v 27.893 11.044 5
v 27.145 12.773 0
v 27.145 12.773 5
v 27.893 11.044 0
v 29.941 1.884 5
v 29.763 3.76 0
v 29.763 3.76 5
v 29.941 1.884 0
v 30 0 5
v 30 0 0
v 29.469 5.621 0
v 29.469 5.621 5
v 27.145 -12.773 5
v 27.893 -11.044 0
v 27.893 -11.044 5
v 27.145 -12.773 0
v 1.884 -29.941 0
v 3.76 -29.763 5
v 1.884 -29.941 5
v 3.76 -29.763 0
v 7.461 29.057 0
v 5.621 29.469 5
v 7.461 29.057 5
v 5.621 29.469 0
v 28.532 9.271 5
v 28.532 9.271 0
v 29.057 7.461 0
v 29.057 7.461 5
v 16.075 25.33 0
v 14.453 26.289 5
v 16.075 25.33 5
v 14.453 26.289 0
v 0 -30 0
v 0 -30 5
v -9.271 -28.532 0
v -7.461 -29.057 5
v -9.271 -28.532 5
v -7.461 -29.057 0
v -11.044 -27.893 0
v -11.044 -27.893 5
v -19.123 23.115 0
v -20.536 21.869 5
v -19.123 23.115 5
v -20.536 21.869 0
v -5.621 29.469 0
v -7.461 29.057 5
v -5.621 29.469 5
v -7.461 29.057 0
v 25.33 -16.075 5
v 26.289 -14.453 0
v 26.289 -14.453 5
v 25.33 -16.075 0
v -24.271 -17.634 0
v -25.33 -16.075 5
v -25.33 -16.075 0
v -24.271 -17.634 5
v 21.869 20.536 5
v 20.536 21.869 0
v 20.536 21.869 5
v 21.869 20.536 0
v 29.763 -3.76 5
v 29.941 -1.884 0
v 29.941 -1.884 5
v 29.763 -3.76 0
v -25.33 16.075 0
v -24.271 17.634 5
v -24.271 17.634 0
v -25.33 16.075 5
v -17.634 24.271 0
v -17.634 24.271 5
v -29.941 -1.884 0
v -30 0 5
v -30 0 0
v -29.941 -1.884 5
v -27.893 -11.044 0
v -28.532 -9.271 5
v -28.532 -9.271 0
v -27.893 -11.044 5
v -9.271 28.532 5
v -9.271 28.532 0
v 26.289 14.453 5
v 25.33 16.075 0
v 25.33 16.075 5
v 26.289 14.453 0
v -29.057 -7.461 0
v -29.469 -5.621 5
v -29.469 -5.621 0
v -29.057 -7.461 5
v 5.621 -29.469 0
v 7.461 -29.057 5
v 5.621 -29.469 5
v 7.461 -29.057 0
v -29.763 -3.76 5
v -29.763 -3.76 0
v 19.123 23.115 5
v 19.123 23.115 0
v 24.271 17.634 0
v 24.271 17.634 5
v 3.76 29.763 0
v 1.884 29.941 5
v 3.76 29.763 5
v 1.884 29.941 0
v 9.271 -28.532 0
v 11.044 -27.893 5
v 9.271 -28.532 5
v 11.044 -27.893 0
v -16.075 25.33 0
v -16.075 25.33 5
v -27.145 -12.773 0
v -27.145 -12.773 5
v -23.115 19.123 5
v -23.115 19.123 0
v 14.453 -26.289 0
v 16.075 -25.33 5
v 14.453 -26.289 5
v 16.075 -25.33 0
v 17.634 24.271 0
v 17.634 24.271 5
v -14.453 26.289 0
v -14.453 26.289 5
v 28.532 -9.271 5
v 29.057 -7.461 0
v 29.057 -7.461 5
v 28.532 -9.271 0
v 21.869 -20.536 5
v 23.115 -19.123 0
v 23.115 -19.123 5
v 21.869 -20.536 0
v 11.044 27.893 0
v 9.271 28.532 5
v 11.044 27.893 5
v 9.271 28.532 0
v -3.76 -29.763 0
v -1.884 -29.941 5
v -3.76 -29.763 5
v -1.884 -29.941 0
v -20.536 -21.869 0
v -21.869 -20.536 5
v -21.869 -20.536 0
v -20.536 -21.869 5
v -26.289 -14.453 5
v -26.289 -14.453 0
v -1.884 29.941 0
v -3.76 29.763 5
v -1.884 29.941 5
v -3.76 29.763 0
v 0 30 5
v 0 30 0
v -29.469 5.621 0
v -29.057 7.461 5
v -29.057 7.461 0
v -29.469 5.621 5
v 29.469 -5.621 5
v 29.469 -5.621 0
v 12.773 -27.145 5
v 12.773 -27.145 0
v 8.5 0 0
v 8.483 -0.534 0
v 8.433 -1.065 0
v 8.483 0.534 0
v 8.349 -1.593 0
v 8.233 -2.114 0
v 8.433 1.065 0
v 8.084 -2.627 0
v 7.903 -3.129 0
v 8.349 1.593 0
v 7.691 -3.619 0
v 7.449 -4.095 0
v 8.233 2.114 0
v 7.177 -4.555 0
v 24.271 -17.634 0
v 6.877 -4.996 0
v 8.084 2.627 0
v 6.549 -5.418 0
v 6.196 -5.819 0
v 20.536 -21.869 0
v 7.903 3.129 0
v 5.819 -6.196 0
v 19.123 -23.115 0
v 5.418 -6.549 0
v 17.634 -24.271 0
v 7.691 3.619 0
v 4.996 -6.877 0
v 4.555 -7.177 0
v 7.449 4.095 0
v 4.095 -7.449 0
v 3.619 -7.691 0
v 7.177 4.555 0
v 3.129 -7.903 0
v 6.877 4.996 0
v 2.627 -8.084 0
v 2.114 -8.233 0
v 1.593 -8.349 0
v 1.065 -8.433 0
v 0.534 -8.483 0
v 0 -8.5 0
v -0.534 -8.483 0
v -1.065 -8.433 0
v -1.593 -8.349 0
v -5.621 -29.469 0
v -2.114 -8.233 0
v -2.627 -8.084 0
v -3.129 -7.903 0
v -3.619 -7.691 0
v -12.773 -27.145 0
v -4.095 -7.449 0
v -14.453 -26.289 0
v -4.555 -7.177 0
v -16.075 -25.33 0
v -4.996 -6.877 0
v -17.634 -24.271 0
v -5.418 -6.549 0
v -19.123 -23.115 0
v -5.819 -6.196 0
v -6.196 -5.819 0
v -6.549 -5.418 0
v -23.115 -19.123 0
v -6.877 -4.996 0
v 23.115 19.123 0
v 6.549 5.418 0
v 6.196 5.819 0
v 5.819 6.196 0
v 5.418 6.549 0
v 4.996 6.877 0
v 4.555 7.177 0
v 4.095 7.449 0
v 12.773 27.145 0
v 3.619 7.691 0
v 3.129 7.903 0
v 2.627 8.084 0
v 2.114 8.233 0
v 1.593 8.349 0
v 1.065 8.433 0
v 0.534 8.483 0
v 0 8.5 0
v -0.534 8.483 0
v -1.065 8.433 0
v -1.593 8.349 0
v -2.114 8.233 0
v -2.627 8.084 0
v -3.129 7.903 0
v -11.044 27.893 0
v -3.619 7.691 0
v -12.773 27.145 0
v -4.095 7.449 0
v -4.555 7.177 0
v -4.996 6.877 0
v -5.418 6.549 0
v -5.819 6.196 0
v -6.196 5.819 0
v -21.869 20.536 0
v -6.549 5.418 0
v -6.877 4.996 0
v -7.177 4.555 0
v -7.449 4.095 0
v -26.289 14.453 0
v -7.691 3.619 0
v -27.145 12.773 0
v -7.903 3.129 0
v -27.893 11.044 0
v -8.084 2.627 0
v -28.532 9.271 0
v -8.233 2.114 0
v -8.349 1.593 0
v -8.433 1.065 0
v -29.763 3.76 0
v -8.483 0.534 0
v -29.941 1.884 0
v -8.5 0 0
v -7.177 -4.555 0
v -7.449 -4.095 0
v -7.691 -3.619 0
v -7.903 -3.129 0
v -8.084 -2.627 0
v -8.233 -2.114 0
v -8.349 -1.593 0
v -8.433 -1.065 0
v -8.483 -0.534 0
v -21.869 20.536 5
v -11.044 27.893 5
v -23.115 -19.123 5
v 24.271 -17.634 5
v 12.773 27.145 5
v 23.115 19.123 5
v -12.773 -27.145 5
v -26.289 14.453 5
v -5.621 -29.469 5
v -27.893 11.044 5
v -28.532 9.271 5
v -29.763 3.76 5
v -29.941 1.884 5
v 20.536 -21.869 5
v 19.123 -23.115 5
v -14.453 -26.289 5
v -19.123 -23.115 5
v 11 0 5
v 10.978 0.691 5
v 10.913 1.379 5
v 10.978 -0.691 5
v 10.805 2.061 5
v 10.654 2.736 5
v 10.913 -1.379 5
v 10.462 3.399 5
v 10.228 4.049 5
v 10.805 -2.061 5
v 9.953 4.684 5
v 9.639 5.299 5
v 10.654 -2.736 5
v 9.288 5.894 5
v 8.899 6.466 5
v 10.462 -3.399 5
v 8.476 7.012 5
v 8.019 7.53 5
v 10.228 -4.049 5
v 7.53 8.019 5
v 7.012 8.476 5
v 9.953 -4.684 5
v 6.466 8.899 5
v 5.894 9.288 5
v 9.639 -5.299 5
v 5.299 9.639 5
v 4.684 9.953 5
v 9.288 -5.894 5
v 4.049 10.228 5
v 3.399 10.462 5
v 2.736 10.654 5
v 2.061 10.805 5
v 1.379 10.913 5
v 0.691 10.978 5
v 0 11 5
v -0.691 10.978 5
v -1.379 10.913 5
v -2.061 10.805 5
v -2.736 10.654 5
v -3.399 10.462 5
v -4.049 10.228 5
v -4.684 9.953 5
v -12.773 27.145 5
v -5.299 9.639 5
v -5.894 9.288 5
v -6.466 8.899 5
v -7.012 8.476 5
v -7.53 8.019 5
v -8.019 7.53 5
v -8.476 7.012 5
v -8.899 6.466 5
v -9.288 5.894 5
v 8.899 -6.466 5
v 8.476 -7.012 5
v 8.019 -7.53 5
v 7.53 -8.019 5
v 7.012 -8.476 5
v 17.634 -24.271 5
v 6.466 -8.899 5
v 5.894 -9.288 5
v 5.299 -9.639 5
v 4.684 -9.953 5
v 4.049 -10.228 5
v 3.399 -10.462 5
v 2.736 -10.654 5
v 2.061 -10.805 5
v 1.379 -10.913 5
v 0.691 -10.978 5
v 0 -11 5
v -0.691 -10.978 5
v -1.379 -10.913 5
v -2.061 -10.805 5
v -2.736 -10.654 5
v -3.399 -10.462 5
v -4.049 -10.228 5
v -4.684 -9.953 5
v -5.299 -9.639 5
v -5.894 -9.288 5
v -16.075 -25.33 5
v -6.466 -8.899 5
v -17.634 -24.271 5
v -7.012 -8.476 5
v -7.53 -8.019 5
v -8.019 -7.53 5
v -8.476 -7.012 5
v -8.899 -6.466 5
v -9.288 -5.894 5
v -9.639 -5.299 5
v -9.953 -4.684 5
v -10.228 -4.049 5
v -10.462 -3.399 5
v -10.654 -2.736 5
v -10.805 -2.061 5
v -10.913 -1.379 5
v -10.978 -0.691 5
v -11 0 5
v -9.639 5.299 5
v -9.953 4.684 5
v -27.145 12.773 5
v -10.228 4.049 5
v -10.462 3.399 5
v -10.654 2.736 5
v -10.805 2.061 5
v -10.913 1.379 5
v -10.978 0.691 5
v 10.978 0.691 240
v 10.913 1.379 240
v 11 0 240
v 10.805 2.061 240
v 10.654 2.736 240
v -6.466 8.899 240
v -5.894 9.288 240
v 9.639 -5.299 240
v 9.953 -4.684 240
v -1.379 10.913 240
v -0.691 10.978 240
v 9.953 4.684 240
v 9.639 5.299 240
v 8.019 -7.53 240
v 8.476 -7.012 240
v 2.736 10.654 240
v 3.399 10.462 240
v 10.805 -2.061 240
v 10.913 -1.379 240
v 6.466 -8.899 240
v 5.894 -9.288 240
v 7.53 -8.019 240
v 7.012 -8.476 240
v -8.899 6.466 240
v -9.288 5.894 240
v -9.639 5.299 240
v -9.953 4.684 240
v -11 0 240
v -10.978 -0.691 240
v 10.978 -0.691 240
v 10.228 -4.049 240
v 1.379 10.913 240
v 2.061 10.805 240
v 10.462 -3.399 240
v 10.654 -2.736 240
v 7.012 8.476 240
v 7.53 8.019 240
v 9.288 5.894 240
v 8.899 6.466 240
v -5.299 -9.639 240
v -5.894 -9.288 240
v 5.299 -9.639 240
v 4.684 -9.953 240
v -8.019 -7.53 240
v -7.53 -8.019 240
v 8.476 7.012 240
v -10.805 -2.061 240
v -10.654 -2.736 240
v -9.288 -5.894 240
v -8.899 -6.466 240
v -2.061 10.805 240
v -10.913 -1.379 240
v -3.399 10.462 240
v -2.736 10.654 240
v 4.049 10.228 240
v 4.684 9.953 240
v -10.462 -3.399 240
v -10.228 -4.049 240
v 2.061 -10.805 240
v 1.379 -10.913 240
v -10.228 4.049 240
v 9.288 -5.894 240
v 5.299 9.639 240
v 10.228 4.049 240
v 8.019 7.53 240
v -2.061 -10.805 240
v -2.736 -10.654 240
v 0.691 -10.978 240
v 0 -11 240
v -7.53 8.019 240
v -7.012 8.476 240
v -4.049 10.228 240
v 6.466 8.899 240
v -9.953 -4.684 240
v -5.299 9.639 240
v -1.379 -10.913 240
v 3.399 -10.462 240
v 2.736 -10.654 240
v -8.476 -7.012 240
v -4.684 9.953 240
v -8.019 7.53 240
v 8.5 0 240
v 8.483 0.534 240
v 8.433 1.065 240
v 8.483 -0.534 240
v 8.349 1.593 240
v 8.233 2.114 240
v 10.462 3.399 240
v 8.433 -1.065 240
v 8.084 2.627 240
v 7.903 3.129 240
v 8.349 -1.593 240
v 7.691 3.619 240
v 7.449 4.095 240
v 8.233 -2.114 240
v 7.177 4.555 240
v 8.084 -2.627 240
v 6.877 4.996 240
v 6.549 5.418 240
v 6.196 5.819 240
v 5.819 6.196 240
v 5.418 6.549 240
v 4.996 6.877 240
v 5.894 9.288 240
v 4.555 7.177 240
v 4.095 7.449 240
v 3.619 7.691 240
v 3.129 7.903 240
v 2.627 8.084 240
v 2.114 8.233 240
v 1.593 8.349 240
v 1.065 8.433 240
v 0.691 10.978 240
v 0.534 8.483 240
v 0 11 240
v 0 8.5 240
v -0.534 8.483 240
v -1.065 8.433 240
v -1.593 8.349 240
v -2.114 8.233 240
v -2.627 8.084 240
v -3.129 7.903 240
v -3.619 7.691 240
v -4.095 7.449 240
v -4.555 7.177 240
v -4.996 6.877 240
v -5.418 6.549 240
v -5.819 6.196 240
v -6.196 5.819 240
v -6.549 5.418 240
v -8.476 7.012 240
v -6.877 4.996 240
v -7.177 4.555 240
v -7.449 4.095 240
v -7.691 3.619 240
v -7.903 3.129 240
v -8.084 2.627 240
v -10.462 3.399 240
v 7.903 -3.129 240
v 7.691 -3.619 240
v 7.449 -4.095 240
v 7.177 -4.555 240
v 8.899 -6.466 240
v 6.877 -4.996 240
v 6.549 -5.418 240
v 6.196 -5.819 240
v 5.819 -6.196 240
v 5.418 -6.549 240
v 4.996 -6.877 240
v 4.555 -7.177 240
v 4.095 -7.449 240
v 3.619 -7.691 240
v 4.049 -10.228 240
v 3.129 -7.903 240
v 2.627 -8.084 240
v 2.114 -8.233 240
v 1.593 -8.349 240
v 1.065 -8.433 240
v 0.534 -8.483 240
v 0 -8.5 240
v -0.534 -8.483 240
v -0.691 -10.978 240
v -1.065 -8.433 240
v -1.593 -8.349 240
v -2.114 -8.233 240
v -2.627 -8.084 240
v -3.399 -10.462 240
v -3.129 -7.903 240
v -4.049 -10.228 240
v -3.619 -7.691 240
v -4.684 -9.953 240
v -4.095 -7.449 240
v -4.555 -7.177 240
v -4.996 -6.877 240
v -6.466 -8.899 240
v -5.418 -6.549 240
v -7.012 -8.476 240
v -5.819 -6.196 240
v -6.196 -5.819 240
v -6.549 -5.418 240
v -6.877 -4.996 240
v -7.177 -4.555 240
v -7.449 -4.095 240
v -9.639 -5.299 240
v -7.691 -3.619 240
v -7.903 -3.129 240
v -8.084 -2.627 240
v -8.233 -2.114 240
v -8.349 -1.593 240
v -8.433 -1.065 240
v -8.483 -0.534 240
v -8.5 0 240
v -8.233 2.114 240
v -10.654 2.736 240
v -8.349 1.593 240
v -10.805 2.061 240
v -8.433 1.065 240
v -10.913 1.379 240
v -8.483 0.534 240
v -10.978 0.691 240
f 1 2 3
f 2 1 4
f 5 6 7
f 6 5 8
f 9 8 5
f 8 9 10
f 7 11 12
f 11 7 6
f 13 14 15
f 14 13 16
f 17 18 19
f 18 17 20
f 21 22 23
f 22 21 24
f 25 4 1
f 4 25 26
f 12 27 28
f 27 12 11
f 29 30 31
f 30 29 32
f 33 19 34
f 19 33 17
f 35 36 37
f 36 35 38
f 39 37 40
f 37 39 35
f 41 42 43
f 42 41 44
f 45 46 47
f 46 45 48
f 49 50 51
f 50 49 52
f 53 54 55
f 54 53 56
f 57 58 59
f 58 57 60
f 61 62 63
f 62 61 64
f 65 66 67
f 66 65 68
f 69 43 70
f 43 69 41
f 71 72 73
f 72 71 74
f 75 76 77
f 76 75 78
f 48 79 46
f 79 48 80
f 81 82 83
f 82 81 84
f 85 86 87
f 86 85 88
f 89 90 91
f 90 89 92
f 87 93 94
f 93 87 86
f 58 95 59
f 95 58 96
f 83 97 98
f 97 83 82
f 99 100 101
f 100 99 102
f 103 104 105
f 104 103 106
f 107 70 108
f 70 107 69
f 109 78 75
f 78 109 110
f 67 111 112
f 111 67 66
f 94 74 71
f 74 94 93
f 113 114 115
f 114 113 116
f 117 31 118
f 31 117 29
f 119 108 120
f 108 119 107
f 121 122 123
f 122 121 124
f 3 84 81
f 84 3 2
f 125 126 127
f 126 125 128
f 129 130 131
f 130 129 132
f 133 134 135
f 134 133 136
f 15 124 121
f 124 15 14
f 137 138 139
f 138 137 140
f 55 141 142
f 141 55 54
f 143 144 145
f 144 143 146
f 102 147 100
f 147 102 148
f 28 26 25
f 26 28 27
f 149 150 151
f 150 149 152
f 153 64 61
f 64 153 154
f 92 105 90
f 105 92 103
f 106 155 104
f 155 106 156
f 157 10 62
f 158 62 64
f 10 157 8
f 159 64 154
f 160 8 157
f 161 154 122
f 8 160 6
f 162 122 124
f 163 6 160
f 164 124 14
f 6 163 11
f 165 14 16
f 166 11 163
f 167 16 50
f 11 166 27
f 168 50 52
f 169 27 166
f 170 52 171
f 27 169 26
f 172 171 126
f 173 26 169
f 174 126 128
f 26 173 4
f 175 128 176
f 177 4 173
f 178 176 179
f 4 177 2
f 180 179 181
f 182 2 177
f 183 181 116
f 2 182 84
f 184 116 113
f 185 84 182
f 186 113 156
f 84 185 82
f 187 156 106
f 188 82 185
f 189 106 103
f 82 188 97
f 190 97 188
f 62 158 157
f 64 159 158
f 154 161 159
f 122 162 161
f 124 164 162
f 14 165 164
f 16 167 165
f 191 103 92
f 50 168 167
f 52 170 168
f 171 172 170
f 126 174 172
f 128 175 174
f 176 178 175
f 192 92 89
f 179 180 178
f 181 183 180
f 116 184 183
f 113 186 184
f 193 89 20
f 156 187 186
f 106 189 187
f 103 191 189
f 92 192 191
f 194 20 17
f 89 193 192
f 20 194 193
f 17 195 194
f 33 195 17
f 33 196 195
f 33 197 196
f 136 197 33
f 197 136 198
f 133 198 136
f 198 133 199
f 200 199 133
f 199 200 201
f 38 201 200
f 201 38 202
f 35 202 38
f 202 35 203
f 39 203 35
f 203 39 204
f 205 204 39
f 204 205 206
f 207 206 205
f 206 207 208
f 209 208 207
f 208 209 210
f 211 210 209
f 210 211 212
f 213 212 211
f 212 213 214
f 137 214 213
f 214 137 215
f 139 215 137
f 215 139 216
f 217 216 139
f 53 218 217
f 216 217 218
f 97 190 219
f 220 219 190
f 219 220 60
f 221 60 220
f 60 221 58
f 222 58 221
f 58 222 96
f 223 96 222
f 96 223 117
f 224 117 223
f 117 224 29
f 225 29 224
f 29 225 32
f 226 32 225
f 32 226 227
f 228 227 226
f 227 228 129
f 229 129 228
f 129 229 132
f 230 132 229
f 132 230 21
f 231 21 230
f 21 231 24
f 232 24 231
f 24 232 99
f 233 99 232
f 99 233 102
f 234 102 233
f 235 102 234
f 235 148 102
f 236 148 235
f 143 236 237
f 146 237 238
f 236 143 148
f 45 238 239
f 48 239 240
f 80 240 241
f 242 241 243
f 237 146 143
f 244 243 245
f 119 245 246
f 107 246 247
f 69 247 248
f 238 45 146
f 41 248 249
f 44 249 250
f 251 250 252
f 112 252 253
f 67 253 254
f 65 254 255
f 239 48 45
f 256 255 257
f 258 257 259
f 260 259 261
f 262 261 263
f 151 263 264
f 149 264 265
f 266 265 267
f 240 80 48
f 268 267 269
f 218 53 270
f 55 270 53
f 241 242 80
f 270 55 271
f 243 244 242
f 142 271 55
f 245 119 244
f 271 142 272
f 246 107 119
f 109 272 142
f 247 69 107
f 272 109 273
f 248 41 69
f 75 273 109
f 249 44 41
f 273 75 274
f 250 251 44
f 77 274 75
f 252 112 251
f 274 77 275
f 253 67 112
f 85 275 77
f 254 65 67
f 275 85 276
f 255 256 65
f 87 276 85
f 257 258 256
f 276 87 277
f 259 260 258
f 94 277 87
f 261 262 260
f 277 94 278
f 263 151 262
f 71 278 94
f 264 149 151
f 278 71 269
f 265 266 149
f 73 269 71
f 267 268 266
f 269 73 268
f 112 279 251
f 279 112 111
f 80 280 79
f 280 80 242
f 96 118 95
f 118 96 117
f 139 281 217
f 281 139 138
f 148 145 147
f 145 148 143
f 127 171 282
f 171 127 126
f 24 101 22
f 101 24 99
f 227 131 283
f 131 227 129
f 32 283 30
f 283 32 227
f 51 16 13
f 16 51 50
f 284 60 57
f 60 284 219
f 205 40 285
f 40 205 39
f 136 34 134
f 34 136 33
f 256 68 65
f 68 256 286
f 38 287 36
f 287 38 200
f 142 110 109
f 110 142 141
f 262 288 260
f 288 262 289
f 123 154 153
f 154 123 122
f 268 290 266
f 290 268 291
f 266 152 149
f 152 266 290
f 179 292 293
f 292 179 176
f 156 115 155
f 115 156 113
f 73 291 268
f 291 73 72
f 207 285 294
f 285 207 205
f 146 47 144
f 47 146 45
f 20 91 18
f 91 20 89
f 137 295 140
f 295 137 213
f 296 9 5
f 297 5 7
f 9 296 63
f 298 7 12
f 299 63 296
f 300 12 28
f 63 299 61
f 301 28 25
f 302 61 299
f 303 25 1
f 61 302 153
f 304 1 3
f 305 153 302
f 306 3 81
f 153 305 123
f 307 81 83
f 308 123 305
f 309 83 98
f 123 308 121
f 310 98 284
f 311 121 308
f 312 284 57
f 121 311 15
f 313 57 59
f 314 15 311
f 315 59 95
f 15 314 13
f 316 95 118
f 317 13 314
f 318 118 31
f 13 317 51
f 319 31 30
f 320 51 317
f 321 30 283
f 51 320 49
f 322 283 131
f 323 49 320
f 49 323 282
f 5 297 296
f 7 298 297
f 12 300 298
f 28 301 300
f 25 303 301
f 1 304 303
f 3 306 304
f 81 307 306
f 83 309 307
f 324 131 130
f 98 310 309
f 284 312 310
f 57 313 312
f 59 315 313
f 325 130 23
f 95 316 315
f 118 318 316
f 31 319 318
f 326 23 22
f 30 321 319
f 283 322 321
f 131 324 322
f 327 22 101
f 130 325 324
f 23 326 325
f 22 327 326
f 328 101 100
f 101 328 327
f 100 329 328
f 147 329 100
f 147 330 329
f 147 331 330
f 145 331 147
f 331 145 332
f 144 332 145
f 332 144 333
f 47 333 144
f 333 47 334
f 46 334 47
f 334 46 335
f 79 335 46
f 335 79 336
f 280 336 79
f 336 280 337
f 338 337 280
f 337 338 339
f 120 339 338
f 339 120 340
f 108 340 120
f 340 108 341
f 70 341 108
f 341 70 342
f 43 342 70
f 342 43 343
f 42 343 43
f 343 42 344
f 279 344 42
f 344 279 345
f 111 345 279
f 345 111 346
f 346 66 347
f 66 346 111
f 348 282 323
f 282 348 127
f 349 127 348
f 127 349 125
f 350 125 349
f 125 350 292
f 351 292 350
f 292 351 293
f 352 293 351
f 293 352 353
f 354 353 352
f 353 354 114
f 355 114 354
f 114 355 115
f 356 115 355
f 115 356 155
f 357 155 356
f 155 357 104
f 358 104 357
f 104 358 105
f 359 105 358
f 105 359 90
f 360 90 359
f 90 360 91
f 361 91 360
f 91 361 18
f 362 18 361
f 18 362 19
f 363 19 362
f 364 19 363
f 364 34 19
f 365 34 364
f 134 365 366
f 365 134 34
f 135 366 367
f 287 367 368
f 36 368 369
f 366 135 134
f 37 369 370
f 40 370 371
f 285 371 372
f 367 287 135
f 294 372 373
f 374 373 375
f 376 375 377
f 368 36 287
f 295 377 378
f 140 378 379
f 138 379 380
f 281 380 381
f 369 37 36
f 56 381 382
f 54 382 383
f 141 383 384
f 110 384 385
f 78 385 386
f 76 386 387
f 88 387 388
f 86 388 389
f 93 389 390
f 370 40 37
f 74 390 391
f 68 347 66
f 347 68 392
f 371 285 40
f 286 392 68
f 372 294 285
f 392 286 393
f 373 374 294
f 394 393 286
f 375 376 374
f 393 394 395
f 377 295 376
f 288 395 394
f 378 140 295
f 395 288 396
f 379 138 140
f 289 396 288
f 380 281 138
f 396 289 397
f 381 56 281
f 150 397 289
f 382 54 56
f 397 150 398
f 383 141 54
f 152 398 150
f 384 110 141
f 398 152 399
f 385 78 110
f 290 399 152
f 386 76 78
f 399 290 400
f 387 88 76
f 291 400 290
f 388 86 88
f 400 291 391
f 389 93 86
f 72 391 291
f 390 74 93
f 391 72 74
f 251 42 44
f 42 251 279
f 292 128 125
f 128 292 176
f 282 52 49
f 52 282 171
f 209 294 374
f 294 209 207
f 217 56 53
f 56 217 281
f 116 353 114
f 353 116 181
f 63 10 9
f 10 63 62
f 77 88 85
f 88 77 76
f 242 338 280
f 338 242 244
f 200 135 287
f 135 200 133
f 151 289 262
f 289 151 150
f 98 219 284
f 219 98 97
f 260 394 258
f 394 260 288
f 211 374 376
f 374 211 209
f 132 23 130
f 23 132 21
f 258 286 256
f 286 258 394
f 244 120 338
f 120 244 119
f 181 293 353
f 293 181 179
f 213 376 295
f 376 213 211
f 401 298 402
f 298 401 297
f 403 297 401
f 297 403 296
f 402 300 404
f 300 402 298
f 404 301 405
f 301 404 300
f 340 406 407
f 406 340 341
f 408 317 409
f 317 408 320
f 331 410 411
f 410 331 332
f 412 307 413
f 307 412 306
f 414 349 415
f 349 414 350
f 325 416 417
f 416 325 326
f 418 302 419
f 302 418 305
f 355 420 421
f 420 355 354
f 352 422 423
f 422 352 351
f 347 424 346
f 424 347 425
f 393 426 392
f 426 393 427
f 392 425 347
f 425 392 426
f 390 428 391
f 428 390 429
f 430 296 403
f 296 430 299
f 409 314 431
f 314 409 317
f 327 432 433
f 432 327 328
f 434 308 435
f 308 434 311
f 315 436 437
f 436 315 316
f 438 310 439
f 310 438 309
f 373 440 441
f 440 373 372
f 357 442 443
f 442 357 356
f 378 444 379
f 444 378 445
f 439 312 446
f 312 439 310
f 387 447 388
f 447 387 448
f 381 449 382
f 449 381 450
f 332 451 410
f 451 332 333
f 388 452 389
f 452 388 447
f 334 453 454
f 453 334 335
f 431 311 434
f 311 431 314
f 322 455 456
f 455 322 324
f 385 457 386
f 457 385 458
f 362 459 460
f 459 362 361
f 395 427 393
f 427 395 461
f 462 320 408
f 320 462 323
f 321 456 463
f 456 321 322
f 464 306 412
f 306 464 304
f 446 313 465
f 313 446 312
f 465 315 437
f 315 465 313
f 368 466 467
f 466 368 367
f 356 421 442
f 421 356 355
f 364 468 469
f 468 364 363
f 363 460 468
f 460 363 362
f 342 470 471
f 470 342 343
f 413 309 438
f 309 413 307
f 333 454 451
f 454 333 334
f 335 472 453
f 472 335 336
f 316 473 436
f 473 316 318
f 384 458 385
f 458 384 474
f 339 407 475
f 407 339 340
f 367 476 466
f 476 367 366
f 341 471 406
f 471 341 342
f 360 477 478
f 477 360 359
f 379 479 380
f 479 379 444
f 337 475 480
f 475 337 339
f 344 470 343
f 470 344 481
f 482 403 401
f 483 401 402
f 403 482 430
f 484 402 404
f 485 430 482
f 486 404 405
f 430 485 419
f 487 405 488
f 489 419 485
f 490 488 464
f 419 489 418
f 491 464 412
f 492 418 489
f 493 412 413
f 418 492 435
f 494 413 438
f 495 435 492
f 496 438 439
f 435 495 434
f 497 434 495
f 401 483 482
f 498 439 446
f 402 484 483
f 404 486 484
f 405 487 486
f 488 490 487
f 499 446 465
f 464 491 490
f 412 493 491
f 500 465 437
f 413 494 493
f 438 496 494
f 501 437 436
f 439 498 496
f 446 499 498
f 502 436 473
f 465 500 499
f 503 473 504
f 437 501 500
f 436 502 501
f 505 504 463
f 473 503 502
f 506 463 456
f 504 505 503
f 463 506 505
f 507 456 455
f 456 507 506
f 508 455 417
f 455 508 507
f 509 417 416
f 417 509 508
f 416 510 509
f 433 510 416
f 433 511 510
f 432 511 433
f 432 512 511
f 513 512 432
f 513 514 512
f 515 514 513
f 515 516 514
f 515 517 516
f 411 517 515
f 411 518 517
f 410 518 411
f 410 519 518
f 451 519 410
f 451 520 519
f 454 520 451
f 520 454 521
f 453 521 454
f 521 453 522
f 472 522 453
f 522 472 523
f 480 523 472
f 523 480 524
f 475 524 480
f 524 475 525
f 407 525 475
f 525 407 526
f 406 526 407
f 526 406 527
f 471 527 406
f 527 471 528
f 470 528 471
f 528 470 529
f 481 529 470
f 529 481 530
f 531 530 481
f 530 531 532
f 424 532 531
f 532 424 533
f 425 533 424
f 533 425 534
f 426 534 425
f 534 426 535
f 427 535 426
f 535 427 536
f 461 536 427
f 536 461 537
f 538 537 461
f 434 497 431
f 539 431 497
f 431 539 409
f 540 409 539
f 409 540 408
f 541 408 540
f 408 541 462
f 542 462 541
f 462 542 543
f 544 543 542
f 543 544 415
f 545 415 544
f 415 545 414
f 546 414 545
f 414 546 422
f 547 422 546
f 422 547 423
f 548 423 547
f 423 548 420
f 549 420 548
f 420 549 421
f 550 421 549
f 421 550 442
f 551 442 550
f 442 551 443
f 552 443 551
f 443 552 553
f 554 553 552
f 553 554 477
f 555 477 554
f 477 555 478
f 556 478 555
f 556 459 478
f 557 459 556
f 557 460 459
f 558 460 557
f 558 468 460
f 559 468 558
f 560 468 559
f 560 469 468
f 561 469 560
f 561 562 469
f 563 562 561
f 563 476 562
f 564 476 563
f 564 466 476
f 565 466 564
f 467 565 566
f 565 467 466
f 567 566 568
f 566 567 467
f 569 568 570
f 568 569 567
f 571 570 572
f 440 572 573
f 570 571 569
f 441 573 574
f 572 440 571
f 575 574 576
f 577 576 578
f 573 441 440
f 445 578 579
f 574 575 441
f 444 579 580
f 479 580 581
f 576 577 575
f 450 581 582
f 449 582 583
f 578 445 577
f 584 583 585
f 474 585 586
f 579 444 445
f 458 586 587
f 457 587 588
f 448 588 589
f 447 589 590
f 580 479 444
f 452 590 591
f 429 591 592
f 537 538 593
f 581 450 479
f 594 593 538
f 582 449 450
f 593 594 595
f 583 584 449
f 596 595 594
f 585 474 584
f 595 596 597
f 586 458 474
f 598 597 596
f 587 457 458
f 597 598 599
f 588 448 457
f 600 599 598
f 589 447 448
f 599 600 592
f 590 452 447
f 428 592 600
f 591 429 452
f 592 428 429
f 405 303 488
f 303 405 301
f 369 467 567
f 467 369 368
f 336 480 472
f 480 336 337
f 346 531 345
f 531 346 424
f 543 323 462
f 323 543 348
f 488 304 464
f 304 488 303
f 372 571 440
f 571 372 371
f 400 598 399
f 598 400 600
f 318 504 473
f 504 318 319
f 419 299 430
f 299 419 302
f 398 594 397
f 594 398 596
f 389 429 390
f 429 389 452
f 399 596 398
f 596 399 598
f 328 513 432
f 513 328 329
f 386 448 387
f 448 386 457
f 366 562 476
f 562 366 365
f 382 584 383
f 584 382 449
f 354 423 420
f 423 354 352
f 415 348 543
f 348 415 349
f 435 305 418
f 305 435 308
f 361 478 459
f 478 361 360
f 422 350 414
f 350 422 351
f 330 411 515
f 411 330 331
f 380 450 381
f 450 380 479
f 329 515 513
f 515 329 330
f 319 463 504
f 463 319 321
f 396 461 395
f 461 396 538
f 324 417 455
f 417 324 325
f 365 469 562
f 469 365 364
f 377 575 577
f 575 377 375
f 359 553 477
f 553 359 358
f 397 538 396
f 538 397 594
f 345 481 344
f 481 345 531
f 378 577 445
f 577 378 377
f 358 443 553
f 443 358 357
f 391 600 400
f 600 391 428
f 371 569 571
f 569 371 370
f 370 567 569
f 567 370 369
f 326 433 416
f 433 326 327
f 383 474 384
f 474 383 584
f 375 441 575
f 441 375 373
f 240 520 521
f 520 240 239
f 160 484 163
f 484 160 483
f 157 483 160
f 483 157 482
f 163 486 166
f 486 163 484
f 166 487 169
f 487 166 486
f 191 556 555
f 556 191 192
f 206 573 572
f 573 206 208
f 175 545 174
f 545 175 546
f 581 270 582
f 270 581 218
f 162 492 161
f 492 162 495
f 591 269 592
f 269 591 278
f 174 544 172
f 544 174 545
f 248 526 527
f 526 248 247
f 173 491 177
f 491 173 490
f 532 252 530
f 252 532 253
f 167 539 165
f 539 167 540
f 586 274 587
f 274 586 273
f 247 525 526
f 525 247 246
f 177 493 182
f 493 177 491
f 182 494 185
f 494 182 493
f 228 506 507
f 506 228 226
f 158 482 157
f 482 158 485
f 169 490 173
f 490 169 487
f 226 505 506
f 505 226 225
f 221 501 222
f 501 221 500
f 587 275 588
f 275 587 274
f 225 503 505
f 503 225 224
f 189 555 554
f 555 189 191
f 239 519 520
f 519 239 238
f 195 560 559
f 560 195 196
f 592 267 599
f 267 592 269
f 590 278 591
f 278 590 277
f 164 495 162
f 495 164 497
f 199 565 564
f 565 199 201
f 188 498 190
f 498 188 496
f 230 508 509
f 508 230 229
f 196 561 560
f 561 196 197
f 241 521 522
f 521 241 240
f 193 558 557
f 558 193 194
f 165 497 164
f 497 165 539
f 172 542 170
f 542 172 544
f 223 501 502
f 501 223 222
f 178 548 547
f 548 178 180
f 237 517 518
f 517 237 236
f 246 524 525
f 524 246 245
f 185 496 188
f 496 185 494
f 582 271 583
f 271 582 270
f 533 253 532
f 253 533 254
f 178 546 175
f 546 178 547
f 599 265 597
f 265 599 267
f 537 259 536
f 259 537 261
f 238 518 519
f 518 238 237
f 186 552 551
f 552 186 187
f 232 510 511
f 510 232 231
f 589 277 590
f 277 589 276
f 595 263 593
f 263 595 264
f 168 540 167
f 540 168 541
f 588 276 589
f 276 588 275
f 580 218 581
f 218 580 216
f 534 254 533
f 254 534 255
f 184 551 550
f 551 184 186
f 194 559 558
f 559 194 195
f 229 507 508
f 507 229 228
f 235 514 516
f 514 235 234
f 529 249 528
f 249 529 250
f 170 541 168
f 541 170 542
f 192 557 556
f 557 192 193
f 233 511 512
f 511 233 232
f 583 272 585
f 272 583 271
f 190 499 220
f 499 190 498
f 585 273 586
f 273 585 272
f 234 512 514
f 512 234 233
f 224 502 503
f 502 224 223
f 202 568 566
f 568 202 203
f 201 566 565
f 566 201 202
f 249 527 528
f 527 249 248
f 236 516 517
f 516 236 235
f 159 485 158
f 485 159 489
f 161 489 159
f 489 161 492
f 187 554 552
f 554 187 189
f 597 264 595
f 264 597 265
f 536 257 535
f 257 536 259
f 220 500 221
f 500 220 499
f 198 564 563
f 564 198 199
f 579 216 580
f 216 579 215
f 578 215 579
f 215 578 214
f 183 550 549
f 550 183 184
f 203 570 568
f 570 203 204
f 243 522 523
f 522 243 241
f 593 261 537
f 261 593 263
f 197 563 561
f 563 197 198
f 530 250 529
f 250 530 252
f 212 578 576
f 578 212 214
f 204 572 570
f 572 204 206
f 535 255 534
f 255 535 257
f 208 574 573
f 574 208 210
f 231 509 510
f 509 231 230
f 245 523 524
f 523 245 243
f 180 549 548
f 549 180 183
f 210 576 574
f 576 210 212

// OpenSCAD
/// holds smol spools (designed for electrical tape)
$fn = 100;

d = 22;
h = 240;
b = 60;
w = 5;

difference() {
  union() {
    cylinder(w, d=b);
    cylinder(h, d=d);
  }
  cylinder(h, d=d-w);
}
